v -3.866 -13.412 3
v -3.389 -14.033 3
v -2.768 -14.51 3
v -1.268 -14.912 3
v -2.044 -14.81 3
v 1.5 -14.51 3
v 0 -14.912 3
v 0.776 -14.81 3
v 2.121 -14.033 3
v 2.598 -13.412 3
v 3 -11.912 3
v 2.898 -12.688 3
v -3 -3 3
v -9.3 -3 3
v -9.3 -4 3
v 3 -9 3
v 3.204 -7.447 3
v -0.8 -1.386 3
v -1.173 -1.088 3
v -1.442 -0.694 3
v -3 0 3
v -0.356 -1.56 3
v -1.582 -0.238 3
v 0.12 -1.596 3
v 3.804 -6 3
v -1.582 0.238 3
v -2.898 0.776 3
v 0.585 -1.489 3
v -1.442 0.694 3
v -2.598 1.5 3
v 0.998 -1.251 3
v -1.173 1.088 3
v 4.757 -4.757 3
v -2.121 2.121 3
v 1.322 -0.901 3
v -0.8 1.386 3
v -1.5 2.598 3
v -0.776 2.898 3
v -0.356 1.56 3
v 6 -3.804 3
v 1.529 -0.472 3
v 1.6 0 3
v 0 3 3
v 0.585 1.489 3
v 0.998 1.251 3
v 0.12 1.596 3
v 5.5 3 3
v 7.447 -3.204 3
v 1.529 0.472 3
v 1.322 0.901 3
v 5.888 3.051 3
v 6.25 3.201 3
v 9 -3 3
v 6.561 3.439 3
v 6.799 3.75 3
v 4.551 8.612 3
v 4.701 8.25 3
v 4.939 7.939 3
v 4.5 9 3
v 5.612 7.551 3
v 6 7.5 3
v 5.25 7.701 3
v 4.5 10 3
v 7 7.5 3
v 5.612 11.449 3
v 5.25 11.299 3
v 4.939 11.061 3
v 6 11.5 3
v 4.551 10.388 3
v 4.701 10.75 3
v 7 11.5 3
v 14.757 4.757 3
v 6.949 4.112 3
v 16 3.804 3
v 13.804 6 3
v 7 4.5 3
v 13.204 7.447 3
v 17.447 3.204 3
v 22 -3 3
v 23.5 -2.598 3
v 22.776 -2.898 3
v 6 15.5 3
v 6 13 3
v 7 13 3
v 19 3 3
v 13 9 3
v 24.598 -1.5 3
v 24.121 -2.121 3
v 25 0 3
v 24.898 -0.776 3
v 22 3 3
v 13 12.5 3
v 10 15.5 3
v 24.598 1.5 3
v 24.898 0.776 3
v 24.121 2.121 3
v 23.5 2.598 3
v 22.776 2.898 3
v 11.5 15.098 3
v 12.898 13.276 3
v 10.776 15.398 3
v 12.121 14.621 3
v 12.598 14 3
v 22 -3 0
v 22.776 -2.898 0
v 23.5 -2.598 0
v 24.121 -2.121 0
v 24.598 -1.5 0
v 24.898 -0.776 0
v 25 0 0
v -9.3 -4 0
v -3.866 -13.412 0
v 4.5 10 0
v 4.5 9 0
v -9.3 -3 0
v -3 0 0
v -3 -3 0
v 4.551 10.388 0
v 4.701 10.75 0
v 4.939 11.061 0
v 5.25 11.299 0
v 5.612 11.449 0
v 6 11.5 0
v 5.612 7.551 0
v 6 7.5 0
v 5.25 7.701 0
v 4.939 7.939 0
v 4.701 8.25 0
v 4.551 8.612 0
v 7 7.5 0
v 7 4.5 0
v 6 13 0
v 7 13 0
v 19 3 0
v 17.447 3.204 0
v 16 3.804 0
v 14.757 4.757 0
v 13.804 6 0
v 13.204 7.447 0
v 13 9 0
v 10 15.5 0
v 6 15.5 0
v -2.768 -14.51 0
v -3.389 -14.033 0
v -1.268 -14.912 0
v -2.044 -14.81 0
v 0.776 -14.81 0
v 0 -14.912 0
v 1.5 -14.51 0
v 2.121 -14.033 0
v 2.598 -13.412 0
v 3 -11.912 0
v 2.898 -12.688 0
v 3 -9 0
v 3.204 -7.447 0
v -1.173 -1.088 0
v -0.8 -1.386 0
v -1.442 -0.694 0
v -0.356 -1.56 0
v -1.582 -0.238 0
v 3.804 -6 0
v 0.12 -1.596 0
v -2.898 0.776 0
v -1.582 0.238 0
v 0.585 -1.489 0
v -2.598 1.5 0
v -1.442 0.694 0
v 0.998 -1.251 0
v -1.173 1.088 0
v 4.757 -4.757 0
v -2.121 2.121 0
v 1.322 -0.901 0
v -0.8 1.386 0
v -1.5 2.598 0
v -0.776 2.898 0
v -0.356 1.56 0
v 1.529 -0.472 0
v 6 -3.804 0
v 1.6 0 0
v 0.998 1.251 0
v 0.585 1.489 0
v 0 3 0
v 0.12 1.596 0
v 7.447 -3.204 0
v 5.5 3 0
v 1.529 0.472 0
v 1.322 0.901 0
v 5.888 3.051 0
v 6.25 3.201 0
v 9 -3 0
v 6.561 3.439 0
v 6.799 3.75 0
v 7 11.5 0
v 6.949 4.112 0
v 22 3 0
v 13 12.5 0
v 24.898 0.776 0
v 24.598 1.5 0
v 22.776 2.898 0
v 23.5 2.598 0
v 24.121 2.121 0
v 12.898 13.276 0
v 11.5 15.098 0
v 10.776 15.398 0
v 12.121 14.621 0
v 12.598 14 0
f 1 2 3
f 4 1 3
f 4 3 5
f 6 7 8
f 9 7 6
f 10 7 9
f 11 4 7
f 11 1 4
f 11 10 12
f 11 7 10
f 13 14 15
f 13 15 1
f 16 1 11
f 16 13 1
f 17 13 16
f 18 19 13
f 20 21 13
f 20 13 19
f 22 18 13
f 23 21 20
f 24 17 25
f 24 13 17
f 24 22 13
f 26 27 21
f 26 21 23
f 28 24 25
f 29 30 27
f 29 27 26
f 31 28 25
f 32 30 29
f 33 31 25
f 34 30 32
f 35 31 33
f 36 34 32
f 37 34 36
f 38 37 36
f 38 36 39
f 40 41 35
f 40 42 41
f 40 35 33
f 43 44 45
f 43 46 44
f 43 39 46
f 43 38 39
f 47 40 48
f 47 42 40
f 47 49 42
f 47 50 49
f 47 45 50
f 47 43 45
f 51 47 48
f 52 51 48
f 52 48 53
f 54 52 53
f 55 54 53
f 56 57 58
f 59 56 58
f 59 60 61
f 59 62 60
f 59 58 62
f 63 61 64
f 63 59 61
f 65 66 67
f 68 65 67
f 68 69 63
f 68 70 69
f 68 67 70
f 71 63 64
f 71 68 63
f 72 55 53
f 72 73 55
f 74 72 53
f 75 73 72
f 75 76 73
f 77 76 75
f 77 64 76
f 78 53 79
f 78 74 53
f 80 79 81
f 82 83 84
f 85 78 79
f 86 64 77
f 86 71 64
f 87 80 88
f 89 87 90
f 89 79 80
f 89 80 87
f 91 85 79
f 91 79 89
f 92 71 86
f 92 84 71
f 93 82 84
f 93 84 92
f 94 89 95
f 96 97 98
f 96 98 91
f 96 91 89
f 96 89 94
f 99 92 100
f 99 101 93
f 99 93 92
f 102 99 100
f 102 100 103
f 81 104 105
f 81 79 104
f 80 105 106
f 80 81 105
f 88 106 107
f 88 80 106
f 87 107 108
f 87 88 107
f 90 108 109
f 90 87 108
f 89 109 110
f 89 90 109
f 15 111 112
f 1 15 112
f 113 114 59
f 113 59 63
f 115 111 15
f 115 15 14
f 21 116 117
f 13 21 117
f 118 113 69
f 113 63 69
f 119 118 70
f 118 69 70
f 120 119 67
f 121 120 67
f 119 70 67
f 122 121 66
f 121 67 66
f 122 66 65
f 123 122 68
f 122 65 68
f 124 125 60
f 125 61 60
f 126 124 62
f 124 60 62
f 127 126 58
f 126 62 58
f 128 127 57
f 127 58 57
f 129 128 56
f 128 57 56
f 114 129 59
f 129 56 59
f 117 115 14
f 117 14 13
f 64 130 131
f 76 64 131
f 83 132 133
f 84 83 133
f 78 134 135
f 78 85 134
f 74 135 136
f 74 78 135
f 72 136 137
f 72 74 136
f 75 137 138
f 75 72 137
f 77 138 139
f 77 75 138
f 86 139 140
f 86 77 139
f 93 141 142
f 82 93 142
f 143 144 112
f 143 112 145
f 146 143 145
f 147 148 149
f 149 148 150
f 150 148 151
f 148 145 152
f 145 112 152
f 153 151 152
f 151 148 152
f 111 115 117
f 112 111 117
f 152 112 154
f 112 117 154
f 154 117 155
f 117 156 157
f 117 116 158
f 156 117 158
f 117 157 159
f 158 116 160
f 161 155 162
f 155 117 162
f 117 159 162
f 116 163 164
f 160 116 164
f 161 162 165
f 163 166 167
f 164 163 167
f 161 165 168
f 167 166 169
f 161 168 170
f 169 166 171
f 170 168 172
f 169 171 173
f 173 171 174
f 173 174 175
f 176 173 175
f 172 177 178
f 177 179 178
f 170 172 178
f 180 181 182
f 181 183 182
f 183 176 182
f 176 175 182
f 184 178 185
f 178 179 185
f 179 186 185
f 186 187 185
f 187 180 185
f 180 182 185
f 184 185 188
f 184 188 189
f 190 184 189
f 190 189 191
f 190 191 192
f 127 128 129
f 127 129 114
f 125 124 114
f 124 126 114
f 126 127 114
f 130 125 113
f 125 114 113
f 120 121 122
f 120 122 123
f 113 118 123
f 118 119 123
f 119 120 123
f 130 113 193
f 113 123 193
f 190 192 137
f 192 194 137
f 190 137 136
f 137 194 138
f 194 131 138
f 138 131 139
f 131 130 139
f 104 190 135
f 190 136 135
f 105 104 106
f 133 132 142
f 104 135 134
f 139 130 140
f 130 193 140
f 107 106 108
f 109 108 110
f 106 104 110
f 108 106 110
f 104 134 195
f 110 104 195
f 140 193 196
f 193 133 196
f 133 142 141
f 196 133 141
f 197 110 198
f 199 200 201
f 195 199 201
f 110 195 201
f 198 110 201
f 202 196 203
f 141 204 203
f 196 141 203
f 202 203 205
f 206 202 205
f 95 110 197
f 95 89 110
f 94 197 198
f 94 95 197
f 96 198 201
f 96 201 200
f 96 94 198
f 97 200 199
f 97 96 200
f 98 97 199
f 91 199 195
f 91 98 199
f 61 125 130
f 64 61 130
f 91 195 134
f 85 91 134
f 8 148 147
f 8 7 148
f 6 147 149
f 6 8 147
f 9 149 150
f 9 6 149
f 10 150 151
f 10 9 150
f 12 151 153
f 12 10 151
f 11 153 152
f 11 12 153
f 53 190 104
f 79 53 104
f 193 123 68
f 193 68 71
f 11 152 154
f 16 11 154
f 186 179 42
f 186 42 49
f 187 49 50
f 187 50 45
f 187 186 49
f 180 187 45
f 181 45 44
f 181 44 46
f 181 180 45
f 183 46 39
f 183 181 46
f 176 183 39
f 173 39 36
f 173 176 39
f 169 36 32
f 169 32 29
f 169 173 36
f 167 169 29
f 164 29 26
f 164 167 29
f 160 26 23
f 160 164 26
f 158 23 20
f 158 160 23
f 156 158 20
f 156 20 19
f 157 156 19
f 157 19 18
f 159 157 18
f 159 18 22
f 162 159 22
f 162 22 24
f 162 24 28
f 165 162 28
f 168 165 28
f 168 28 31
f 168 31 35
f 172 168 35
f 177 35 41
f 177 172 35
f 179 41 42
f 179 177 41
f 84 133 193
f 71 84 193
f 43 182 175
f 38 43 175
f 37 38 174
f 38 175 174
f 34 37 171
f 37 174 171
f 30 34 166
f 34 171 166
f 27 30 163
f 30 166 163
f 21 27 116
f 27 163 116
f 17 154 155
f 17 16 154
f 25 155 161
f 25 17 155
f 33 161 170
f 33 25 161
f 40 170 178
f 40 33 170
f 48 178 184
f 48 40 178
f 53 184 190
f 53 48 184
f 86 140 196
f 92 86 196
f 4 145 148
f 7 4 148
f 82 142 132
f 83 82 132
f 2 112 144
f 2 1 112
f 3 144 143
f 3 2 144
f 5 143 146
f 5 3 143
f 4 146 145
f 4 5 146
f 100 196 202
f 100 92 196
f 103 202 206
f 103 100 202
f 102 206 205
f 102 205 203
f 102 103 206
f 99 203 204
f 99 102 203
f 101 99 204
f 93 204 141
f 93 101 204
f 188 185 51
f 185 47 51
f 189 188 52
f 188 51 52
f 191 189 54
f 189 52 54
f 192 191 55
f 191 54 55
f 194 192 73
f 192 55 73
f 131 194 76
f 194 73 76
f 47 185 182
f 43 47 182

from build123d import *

# Parameters (mm, degrees)
F0_R     = 1.6
F0_W     = 6.3
F0_H     = 1
F0_W_2   = 2.5
F0_H_2   = 4
F1_DEPTH = 3
F2_R     = 2.99999
F3_R     = 6
F4_R     = 1.5


# Not quite as in the source:
# - a fillet or chamfer is up to 0.001 mm smaller than in the source, because OpenCascade refuses the exact size


with BuildPart() as f1:
    # F0 (on Top) → F1 (new body)
    with BuildSketch(Plane.XY):
        with BuildLine():
            ThreePointArc((0, 3), (-2.1213203436, 2.1213203436), (-3, 0))
            Line((-3, 0), (-3, -3))
            Line((-3, -3), (-3, -4))
            Line((-3, -4), (-9.3, -4))
            Line((-9.3, -4), (-3, -14.9119200877))
            Line((-3, -14.9119200877), (3, -14.9119200877))
            Line((3, -14.9119200877), (3, -3))
            Line((3, -3), (25, -3))
            Line((25, -3), (25, 3))
            Line((25, 3), (13, 3))
            Line((13, 3), (7, 3))
            Line((7, 3), (0, 3))
        make_face()
        Circle(F0_R, mode=Mode.SUBTRACT)
        with Locations((-6.15, -3.5)):
            Rectangle(F0_W, F0_H)
        Polygon((7, 7.5), (7, 3), (13, 3), (13, 13), (7, 13), (7, 11.5), align=None)
        with Locations((5.75, 9.5)):
            Rectangle(F0_W_2, F0_H_2)
        Polygon((7, 13), (13, 13), (13, 15.5), (6, 15.5), (6, 13), align=None)
    extrude(amount=F1_DEPTH)

    # F2 (radius 3 in the source; OpenCascade refuses exactly that, so slightly less here)
    f2_edges = [f1.edges().sort_by_distance(p)[0] for p in [
        (-3, -14.91192, 1.5),
        (3, -14.91192, 1.5),
        (25, -3, 1.5),
        (25, 3, 1.5),
        (13, 15.5, 1.5),
    ]]
    fillet(f2_edges, radius=F2_R)

    # F3
    f3_edges = [f1.edges().sort_by_distance(p)[0] for p in [
        (3, -3, 1.5),
        (13, 3, 1.5),
    ]]
    fillet(f3_edges, radius=F3_R)

    # F4
    f4_edges = [f1.edges().sort_by_distance(p)[0] for p in [
        (4.5, 11.5, 1.5),
        (4.5, 7.5, 1.5),
        (7, 3, 1.5),
    ]]
    fillet(f4_edges, radius=F4_R)


solid = f1.part
